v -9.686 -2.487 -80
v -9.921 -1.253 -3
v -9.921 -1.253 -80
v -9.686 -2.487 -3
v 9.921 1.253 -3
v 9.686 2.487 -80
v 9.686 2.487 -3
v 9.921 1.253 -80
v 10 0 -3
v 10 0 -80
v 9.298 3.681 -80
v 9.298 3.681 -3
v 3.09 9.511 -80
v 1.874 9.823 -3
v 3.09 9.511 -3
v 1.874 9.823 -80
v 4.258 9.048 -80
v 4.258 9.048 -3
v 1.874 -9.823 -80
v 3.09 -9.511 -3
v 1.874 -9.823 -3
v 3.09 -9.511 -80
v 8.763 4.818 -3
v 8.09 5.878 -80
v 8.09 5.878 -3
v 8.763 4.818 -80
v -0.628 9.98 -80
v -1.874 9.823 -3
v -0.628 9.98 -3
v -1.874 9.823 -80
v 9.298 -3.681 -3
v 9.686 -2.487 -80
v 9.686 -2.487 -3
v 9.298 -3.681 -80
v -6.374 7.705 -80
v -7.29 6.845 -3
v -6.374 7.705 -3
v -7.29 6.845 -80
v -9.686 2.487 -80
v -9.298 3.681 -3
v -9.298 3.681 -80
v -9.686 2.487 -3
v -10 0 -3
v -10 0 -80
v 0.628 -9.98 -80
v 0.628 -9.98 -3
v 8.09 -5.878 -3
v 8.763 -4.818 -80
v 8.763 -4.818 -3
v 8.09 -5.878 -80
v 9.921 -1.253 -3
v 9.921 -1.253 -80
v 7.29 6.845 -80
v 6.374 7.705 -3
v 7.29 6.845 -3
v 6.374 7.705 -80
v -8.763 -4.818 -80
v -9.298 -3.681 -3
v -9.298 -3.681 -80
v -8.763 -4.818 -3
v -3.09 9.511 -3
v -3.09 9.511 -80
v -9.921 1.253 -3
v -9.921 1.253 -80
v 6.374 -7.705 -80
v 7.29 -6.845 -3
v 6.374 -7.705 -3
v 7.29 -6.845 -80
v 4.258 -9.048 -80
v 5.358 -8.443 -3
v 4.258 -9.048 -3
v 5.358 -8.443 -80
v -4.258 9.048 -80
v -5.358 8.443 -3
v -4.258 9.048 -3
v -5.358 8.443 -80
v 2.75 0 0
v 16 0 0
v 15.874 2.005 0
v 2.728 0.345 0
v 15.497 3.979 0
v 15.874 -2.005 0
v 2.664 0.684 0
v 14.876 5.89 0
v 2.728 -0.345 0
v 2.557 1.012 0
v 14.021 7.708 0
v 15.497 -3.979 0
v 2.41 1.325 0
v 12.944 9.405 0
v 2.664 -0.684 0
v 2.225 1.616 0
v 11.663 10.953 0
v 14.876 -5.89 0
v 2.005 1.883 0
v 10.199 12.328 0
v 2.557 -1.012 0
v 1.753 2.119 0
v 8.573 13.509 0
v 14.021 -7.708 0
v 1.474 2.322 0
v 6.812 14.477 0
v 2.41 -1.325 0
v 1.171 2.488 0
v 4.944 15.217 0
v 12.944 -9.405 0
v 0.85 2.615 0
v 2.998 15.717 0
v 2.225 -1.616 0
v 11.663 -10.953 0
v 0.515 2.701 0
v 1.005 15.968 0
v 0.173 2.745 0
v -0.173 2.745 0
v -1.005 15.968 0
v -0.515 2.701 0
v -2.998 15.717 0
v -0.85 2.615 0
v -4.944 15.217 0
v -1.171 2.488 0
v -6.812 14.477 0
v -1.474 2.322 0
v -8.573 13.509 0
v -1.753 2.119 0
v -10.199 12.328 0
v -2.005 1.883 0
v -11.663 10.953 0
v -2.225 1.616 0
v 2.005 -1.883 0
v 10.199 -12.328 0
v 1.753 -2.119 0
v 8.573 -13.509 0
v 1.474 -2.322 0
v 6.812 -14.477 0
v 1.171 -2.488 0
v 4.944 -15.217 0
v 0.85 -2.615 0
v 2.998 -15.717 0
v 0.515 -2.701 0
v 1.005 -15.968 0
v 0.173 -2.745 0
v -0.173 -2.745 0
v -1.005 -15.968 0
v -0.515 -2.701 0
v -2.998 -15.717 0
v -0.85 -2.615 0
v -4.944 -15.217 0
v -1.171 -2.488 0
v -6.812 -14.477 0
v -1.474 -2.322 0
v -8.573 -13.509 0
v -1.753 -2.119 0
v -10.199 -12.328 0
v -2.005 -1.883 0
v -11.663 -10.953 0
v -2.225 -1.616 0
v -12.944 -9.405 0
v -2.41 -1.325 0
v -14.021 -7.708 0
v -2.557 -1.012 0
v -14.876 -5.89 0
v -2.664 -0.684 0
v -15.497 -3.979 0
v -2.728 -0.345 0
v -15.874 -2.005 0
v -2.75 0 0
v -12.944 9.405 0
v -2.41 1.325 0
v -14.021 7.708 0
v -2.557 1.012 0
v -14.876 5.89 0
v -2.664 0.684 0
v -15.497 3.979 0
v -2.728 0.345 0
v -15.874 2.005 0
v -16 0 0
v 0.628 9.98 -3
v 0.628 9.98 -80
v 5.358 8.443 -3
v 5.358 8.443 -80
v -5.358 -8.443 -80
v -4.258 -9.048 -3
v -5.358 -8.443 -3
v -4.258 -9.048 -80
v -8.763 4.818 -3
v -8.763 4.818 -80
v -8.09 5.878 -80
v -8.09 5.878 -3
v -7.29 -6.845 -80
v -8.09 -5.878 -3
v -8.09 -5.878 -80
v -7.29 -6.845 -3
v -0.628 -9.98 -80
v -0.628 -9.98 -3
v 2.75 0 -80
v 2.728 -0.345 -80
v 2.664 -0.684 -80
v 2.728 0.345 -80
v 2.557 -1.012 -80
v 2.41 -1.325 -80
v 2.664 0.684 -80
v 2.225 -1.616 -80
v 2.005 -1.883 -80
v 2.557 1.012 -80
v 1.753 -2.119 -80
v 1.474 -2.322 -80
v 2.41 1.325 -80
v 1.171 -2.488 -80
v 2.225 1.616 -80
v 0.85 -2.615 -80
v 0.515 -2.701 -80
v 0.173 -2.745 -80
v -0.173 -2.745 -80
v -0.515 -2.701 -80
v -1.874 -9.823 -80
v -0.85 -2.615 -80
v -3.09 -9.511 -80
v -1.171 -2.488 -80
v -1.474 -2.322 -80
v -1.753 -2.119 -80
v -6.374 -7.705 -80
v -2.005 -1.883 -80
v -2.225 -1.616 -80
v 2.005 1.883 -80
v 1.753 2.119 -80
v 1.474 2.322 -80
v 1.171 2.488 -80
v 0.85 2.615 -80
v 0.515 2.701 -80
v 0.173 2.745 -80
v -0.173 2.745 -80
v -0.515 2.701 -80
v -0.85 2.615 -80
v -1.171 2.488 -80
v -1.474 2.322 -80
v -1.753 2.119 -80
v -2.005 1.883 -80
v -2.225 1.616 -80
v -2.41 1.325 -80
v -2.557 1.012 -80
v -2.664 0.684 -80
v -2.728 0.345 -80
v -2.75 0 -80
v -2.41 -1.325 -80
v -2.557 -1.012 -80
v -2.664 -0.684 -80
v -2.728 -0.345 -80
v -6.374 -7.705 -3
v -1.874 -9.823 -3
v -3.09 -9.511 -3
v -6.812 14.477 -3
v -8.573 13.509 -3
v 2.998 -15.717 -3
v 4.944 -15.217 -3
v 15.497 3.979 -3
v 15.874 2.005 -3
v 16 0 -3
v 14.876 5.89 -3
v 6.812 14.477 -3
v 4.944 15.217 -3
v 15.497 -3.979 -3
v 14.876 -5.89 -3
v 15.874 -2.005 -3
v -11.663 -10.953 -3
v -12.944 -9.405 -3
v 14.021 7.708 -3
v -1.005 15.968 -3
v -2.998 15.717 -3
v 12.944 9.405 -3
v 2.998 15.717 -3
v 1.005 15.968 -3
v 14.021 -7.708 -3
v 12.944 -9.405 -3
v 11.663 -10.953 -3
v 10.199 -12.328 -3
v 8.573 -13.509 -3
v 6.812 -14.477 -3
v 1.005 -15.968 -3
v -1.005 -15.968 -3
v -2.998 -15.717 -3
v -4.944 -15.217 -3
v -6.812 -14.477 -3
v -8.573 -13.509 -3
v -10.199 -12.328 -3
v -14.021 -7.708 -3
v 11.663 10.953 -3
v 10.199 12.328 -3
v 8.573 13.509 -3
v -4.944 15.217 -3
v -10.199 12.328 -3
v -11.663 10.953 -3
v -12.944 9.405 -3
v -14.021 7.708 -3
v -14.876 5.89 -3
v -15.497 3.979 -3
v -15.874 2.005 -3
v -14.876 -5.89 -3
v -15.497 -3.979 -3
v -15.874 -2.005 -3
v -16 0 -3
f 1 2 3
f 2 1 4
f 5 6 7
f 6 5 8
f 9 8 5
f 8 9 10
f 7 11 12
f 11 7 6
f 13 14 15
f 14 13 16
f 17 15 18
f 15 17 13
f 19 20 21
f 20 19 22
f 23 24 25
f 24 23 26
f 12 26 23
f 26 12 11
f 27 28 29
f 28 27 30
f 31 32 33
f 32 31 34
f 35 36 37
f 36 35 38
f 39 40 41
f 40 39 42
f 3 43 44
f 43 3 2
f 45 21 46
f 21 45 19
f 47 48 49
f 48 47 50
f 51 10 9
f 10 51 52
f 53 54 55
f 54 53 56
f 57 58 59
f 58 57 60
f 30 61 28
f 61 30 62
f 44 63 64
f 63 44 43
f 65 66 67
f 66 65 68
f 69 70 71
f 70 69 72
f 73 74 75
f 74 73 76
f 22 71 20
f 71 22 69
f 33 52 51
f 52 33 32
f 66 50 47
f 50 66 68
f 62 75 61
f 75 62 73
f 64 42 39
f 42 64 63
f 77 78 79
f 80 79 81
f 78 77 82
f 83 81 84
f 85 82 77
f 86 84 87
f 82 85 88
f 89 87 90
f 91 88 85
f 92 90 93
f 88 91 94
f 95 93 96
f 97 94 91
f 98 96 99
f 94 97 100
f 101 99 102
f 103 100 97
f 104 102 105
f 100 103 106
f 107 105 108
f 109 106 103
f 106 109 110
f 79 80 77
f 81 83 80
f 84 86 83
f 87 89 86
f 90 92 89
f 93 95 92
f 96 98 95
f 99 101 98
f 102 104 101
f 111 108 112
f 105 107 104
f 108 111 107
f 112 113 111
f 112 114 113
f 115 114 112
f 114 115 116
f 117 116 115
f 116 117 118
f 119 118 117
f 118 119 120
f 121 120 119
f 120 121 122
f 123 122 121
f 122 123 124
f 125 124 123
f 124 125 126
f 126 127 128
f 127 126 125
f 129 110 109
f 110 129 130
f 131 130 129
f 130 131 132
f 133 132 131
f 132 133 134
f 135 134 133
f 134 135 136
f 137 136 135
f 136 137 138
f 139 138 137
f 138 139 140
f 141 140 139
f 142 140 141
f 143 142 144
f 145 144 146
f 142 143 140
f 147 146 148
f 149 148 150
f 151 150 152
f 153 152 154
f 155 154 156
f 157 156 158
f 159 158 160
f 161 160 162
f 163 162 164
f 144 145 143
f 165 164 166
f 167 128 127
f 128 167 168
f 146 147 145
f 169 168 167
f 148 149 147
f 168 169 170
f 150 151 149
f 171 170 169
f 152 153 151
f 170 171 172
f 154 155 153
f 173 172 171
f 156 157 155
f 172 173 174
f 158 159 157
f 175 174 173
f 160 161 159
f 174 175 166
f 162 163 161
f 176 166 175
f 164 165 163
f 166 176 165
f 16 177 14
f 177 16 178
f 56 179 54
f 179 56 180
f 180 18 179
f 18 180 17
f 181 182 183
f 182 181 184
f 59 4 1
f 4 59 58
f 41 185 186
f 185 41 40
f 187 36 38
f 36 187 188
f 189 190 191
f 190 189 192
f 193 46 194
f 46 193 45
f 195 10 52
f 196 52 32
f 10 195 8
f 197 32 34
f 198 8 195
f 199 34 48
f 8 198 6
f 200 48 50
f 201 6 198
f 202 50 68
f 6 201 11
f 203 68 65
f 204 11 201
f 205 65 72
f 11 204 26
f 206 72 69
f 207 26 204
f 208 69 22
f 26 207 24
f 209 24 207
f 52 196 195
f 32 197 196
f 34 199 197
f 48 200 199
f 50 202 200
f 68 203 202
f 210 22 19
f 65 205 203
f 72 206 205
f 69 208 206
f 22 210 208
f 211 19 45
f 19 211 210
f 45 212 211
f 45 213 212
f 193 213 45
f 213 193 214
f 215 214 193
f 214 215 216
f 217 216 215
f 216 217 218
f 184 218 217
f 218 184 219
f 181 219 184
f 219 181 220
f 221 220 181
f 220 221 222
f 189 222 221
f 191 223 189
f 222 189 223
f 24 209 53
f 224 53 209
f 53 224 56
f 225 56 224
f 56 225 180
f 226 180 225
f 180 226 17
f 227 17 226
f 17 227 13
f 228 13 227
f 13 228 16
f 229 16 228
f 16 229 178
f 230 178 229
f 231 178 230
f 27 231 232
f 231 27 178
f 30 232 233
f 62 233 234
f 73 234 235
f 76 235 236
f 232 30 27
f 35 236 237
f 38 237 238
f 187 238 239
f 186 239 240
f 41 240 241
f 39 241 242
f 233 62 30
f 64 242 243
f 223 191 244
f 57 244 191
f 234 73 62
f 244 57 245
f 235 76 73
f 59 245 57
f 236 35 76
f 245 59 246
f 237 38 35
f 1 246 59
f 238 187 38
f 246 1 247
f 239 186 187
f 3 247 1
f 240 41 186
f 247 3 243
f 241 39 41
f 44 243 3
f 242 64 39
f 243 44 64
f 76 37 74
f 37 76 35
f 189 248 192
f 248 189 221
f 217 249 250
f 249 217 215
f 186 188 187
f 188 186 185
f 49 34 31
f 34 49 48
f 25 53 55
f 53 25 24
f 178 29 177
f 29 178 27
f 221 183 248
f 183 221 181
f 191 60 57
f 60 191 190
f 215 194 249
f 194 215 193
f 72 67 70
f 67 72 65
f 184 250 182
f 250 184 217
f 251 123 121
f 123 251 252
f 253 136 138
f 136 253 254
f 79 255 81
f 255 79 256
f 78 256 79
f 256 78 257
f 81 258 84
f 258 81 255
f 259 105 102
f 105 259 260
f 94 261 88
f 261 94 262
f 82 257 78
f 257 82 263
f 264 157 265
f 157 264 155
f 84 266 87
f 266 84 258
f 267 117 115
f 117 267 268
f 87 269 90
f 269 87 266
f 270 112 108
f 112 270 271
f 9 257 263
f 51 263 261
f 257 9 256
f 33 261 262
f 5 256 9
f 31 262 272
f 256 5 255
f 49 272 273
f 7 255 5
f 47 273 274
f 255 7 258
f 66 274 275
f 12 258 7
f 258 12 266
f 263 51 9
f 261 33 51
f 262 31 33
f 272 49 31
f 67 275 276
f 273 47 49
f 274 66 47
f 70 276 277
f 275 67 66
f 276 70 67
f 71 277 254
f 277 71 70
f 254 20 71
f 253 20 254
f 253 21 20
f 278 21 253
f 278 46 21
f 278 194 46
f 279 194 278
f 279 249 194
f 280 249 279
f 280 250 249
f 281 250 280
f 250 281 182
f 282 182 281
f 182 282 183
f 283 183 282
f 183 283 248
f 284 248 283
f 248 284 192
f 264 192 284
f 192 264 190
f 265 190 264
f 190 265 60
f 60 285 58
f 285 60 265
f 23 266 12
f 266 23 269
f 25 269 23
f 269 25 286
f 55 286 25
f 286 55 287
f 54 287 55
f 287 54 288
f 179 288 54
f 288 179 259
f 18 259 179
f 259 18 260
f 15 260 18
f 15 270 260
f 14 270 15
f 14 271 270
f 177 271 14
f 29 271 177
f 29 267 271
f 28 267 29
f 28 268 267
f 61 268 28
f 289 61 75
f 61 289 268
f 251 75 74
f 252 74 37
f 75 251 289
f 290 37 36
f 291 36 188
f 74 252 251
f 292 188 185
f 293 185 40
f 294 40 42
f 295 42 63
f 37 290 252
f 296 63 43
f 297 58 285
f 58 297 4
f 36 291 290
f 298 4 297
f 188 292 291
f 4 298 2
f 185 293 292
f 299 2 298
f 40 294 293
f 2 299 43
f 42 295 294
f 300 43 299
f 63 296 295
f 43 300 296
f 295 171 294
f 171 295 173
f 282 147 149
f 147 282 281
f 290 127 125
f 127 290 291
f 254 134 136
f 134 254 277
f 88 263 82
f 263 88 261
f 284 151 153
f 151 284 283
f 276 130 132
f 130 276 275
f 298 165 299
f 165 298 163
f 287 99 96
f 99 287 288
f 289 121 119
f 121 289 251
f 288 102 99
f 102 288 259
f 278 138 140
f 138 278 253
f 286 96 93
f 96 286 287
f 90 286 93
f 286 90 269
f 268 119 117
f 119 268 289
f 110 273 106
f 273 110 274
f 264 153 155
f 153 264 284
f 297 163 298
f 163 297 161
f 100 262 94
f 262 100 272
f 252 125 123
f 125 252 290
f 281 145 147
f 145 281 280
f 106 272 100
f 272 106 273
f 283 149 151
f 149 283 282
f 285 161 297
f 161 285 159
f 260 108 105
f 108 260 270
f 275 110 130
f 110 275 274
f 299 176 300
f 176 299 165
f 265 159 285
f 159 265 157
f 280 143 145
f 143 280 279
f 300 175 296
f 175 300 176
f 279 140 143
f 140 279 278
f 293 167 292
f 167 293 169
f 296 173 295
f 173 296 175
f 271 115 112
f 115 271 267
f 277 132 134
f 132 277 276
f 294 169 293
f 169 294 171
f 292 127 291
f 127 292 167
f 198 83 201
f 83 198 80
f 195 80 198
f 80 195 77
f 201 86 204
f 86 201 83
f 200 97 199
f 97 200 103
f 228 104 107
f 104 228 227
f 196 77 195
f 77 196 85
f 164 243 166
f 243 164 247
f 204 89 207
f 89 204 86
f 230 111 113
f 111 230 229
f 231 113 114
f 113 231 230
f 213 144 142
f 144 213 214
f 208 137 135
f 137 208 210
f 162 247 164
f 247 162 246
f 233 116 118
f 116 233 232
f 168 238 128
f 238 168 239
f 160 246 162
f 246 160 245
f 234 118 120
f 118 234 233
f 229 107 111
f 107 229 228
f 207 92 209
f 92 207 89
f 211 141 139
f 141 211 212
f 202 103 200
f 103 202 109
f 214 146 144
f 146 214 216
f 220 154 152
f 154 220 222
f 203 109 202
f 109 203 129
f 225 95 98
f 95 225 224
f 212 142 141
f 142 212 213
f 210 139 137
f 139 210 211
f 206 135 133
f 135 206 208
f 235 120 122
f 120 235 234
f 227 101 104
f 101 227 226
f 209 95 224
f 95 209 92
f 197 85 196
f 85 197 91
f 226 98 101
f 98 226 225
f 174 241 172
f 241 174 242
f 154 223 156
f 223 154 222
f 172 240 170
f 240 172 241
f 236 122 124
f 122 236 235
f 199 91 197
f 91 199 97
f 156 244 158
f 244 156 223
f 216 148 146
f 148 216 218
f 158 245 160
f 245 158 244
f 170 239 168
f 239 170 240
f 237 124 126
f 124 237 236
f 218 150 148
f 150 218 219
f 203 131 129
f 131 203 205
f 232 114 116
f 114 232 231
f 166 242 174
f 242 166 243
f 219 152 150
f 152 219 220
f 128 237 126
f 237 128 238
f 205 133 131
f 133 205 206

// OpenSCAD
$fn = 50;


difference() {
	union() {
		translate(v = [0, 0, -80.0000000000]) {
			cylinder(h = 80, r = 10.0000000000);
		}
		translate(v = [0, 0, -3.0000000000]) {
			cylinder(h = 3, r = 16.0000000000);
		}
	}
	union() {
		#translate(v = [0, 0, -80]) {
			cylinder(h = 80, r = 2.7500000000);
		}
	}
}
